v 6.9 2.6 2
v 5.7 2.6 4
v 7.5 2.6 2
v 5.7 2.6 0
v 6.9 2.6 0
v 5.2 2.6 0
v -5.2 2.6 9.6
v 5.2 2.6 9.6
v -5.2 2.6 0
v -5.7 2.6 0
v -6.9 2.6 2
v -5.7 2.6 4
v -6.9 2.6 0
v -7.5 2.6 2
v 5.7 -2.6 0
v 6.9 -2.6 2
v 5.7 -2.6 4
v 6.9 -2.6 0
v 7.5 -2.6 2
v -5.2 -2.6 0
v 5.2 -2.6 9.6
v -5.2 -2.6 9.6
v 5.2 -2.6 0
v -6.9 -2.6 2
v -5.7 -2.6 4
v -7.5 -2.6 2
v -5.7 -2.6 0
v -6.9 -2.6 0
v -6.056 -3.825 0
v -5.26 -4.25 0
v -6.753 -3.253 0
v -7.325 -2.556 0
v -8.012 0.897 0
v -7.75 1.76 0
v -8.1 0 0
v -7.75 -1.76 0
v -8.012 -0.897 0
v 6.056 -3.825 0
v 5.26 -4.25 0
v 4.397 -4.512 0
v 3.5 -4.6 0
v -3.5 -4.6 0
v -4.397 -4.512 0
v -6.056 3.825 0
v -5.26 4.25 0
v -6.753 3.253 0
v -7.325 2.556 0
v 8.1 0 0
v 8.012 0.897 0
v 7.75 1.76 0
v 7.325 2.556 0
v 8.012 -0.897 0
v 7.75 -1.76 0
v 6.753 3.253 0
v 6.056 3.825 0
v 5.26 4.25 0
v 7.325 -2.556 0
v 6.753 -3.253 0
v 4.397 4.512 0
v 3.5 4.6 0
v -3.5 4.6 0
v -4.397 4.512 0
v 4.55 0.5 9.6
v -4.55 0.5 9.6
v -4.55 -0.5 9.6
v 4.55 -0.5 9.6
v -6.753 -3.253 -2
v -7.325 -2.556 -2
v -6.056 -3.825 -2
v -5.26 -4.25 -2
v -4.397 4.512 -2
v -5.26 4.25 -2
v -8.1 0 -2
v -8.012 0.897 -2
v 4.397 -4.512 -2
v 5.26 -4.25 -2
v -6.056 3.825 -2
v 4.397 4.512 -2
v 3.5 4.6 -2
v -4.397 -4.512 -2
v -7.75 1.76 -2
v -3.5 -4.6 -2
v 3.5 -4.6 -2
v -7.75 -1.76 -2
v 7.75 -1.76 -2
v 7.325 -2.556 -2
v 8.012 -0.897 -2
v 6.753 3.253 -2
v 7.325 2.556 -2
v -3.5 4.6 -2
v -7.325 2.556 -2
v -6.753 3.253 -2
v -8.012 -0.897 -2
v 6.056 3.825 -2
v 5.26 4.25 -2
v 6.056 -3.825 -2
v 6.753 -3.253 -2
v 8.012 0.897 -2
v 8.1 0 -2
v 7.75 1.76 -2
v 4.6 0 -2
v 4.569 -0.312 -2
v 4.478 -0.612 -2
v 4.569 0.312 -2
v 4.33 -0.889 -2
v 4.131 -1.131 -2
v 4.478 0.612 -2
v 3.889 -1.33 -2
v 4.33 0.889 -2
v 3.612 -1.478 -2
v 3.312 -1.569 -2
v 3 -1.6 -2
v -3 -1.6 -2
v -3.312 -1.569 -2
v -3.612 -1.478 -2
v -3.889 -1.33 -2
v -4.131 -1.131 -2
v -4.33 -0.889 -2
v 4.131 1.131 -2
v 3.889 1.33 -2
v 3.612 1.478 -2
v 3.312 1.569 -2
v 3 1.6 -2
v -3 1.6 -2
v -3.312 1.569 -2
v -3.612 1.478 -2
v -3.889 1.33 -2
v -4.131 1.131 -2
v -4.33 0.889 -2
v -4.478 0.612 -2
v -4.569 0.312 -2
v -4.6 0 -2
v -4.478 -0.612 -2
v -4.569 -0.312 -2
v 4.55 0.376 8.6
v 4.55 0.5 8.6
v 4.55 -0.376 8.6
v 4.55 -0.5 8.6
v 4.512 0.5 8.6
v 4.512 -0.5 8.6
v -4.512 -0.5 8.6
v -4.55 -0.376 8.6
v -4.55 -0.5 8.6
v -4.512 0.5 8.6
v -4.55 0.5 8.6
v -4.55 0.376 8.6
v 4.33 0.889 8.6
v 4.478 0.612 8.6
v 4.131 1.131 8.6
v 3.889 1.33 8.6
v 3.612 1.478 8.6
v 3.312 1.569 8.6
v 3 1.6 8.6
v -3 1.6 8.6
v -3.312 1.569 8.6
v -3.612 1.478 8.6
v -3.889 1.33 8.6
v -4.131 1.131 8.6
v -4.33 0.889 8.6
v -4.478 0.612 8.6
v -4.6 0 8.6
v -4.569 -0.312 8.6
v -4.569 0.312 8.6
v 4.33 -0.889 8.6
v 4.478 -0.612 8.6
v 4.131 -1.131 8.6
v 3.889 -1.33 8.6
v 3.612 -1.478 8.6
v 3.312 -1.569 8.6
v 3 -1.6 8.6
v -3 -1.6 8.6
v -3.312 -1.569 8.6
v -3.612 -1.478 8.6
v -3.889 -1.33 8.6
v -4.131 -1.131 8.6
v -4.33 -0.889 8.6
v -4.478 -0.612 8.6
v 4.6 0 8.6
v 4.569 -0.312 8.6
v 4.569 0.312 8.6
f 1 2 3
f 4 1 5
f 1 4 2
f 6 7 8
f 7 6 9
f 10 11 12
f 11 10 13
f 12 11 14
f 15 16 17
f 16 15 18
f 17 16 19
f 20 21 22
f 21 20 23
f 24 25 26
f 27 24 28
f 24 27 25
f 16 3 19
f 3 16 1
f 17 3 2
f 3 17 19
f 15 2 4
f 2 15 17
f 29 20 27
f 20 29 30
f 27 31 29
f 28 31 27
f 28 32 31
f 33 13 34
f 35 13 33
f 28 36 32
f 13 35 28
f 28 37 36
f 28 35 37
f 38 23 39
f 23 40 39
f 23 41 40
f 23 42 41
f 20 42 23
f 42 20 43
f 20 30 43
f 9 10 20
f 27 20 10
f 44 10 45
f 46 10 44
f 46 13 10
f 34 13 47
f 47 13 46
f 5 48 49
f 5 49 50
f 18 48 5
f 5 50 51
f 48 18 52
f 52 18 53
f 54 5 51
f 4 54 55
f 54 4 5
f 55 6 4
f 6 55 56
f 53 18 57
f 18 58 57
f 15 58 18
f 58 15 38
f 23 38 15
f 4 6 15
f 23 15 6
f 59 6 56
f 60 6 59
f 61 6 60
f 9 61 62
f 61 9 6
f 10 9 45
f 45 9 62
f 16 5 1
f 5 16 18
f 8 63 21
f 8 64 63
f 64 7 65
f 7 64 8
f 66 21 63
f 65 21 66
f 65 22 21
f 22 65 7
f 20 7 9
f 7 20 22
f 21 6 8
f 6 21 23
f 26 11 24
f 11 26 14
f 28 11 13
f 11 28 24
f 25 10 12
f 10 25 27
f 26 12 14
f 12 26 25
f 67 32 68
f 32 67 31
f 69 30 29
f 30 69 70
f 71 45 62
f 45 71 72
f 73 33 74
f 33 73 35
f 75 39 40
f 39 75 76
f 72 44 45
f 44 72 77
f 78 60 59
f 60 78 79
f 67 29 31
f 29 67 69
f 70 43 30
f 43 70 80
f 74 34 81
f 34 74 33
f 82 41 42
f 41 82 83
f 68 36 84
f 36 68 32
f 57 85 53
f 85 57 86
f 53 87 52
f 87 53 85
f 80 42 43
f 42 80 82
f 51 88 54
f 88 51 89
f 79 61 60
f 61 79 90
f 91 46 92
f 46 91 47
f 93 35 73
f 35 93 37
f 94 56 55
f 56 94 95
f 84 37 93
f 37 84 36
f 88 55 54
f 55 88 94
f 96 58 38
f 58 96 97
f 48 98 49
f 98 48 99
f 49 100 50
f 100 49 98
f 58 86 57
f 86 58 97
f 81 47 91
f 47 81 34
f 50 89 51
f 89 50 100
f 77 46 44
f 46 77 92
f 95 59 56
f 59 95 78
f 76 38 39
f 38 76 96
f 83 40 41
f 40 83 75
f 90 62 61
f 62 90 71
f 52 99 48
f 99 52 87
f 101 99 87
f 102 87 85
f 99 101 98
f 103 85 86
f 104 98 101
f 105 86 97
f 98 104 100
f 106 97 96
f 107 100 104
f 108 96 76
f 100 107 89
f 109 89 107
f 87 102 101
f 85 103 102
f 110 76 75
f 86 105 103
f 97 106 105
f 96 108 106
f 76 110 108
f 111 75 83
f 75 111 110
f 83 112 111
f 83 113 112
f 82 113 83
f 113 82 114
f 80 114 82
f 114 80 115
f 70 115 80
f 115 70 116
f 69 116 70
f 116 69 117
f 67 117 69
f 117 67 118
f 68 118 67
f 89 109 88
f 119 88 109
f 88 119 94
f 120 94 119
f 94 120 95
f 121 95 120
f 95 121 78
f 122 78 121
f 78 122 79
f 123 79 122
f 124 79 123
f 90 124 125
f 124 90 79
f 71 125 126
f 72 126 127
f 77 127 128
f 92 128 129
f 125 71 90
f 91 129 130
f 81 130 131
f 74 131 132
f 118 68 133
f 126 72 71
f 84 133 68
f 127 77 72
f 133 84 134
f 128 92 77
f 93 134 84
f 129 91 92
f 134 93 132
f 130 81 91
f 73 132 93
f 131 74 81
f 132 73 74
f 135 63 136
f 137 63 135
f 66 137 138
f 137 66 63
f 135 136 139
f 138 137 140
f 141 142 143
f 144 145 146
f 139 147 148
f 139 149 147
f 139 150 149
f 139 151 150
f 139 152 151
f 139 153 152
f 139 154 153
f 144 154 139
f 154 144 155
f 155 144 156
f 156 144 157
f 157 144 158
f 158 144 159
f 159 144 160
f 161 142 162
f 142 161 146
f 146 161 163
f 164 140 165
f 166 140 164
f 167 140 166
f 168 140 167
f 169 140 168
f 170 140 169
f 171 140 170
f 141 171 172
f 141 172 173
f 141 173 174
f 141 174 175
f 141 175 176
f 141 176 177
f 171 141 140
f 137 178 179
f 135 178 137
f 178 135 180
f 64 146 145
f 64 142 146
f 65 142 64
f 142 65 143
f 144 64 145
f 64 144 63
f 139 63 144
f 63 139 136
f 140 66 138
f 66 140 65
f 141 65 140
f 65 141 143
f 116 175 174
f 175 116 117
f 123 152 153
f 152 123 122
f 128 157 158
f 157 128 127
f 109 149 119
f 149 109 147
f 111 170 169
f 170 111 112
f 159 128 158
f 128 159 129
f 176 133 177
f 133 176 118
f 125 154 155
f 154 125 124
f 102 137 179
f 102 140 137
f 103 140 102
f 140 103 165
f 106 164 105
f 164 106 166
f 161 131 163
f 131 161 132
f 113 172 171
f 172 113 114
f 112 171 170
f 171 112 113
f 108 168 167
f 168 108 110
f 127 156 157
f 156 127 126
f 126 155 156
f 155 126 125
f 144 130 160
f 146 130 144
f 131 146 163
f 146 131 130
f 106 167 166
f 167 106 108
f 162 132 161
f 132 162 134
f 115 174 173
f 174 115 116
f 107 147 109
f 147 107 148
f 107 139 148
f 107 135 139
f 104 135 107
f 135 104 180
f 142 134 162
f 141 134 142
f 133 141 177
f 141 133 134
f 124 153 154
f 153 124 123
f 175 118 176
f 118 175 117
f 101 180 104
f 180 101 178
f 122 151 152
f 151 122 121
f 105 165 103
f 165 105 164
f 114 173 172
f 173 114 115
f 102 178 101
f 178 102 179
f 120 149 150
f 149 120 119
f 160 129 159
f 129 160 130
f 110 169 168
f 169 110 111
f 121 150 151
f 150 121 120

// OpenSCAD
$fn=32;


port_width = 9.2;
port_length = 10.6;
port_radius = 1.6;

pcb_width = 9.1;
pcb_thickness = 1;
pcb_cover_length = 1;

wall_thickness = 2;
latch_overhang = 0.6;
latch_height = 2;
latch_gap = 0.5;
latch_width = 1.2;

sleeve_width = port_width + 1.2;
sleeve_thickness = port_radius * 2 + 2;

top_gap = 0;
top_thickness = 2;
top_border = 3;
top_width = port_width + top_border + 4;
top_radius = port_radius + top_border;


outer_x = sleeve_width/2 + latch_gap + latch_width;
outer_y = port_length - top_thickness - top_gap + pcb_cover_length;

echo(outer_x*2);
echo(sleeve_thickness);

module pillinder(width, radius, height) {
  hull() {
    translate([width/2 - radius, 0, 0])
    cylinder(h=height, r=radius);
    translate([-width/2 + radius, 0, 0])
    cylinder(h=height, r=radius);
  }
}
    

difference() {
union() {
  rotate([90,0,0])
  translate([0, 0, -sleeve_thickness/2])
  linear_extrude(sleeve_thickness)
  polygon([
    [-outer_x, 0],
    [-outer_x, wall_thickness],
    [-outer_x - latch_overhang, wall_thickness],
    [-outer_x + latch_width, wall_thickness + latch_height],
    [-outer_x + latch_width, 0],
    [-sleeve_width/2, 0],
    [-sleeve_width/2, outer_y],
    [sleeve_width/2, outer_y],
    [sleeve_width/2, 0],
    [outer_x - latch_width, 0],
    [outer_x - latch_width, wall_thickness + latch_height],
    [outer_x + latch_overhang, wall_thickness],
    [outer_x, wall_thickness],
    [outer_x, 0],
  ]);

  translate([0,0,-top_thickness])
  pillinder(top_width, top_radius, top_thickness);
}

  translate([0, 0, port_length -top_thickness -top_gap + pcb_cover_length/2+1])
  cube([pcb_width, pcb_thickness, pcb_cover_length+2], center=true);


  translate([0, 0, -top_thickness -top_gap])
  pillinder(port_width, port_radius, port_length);
}
